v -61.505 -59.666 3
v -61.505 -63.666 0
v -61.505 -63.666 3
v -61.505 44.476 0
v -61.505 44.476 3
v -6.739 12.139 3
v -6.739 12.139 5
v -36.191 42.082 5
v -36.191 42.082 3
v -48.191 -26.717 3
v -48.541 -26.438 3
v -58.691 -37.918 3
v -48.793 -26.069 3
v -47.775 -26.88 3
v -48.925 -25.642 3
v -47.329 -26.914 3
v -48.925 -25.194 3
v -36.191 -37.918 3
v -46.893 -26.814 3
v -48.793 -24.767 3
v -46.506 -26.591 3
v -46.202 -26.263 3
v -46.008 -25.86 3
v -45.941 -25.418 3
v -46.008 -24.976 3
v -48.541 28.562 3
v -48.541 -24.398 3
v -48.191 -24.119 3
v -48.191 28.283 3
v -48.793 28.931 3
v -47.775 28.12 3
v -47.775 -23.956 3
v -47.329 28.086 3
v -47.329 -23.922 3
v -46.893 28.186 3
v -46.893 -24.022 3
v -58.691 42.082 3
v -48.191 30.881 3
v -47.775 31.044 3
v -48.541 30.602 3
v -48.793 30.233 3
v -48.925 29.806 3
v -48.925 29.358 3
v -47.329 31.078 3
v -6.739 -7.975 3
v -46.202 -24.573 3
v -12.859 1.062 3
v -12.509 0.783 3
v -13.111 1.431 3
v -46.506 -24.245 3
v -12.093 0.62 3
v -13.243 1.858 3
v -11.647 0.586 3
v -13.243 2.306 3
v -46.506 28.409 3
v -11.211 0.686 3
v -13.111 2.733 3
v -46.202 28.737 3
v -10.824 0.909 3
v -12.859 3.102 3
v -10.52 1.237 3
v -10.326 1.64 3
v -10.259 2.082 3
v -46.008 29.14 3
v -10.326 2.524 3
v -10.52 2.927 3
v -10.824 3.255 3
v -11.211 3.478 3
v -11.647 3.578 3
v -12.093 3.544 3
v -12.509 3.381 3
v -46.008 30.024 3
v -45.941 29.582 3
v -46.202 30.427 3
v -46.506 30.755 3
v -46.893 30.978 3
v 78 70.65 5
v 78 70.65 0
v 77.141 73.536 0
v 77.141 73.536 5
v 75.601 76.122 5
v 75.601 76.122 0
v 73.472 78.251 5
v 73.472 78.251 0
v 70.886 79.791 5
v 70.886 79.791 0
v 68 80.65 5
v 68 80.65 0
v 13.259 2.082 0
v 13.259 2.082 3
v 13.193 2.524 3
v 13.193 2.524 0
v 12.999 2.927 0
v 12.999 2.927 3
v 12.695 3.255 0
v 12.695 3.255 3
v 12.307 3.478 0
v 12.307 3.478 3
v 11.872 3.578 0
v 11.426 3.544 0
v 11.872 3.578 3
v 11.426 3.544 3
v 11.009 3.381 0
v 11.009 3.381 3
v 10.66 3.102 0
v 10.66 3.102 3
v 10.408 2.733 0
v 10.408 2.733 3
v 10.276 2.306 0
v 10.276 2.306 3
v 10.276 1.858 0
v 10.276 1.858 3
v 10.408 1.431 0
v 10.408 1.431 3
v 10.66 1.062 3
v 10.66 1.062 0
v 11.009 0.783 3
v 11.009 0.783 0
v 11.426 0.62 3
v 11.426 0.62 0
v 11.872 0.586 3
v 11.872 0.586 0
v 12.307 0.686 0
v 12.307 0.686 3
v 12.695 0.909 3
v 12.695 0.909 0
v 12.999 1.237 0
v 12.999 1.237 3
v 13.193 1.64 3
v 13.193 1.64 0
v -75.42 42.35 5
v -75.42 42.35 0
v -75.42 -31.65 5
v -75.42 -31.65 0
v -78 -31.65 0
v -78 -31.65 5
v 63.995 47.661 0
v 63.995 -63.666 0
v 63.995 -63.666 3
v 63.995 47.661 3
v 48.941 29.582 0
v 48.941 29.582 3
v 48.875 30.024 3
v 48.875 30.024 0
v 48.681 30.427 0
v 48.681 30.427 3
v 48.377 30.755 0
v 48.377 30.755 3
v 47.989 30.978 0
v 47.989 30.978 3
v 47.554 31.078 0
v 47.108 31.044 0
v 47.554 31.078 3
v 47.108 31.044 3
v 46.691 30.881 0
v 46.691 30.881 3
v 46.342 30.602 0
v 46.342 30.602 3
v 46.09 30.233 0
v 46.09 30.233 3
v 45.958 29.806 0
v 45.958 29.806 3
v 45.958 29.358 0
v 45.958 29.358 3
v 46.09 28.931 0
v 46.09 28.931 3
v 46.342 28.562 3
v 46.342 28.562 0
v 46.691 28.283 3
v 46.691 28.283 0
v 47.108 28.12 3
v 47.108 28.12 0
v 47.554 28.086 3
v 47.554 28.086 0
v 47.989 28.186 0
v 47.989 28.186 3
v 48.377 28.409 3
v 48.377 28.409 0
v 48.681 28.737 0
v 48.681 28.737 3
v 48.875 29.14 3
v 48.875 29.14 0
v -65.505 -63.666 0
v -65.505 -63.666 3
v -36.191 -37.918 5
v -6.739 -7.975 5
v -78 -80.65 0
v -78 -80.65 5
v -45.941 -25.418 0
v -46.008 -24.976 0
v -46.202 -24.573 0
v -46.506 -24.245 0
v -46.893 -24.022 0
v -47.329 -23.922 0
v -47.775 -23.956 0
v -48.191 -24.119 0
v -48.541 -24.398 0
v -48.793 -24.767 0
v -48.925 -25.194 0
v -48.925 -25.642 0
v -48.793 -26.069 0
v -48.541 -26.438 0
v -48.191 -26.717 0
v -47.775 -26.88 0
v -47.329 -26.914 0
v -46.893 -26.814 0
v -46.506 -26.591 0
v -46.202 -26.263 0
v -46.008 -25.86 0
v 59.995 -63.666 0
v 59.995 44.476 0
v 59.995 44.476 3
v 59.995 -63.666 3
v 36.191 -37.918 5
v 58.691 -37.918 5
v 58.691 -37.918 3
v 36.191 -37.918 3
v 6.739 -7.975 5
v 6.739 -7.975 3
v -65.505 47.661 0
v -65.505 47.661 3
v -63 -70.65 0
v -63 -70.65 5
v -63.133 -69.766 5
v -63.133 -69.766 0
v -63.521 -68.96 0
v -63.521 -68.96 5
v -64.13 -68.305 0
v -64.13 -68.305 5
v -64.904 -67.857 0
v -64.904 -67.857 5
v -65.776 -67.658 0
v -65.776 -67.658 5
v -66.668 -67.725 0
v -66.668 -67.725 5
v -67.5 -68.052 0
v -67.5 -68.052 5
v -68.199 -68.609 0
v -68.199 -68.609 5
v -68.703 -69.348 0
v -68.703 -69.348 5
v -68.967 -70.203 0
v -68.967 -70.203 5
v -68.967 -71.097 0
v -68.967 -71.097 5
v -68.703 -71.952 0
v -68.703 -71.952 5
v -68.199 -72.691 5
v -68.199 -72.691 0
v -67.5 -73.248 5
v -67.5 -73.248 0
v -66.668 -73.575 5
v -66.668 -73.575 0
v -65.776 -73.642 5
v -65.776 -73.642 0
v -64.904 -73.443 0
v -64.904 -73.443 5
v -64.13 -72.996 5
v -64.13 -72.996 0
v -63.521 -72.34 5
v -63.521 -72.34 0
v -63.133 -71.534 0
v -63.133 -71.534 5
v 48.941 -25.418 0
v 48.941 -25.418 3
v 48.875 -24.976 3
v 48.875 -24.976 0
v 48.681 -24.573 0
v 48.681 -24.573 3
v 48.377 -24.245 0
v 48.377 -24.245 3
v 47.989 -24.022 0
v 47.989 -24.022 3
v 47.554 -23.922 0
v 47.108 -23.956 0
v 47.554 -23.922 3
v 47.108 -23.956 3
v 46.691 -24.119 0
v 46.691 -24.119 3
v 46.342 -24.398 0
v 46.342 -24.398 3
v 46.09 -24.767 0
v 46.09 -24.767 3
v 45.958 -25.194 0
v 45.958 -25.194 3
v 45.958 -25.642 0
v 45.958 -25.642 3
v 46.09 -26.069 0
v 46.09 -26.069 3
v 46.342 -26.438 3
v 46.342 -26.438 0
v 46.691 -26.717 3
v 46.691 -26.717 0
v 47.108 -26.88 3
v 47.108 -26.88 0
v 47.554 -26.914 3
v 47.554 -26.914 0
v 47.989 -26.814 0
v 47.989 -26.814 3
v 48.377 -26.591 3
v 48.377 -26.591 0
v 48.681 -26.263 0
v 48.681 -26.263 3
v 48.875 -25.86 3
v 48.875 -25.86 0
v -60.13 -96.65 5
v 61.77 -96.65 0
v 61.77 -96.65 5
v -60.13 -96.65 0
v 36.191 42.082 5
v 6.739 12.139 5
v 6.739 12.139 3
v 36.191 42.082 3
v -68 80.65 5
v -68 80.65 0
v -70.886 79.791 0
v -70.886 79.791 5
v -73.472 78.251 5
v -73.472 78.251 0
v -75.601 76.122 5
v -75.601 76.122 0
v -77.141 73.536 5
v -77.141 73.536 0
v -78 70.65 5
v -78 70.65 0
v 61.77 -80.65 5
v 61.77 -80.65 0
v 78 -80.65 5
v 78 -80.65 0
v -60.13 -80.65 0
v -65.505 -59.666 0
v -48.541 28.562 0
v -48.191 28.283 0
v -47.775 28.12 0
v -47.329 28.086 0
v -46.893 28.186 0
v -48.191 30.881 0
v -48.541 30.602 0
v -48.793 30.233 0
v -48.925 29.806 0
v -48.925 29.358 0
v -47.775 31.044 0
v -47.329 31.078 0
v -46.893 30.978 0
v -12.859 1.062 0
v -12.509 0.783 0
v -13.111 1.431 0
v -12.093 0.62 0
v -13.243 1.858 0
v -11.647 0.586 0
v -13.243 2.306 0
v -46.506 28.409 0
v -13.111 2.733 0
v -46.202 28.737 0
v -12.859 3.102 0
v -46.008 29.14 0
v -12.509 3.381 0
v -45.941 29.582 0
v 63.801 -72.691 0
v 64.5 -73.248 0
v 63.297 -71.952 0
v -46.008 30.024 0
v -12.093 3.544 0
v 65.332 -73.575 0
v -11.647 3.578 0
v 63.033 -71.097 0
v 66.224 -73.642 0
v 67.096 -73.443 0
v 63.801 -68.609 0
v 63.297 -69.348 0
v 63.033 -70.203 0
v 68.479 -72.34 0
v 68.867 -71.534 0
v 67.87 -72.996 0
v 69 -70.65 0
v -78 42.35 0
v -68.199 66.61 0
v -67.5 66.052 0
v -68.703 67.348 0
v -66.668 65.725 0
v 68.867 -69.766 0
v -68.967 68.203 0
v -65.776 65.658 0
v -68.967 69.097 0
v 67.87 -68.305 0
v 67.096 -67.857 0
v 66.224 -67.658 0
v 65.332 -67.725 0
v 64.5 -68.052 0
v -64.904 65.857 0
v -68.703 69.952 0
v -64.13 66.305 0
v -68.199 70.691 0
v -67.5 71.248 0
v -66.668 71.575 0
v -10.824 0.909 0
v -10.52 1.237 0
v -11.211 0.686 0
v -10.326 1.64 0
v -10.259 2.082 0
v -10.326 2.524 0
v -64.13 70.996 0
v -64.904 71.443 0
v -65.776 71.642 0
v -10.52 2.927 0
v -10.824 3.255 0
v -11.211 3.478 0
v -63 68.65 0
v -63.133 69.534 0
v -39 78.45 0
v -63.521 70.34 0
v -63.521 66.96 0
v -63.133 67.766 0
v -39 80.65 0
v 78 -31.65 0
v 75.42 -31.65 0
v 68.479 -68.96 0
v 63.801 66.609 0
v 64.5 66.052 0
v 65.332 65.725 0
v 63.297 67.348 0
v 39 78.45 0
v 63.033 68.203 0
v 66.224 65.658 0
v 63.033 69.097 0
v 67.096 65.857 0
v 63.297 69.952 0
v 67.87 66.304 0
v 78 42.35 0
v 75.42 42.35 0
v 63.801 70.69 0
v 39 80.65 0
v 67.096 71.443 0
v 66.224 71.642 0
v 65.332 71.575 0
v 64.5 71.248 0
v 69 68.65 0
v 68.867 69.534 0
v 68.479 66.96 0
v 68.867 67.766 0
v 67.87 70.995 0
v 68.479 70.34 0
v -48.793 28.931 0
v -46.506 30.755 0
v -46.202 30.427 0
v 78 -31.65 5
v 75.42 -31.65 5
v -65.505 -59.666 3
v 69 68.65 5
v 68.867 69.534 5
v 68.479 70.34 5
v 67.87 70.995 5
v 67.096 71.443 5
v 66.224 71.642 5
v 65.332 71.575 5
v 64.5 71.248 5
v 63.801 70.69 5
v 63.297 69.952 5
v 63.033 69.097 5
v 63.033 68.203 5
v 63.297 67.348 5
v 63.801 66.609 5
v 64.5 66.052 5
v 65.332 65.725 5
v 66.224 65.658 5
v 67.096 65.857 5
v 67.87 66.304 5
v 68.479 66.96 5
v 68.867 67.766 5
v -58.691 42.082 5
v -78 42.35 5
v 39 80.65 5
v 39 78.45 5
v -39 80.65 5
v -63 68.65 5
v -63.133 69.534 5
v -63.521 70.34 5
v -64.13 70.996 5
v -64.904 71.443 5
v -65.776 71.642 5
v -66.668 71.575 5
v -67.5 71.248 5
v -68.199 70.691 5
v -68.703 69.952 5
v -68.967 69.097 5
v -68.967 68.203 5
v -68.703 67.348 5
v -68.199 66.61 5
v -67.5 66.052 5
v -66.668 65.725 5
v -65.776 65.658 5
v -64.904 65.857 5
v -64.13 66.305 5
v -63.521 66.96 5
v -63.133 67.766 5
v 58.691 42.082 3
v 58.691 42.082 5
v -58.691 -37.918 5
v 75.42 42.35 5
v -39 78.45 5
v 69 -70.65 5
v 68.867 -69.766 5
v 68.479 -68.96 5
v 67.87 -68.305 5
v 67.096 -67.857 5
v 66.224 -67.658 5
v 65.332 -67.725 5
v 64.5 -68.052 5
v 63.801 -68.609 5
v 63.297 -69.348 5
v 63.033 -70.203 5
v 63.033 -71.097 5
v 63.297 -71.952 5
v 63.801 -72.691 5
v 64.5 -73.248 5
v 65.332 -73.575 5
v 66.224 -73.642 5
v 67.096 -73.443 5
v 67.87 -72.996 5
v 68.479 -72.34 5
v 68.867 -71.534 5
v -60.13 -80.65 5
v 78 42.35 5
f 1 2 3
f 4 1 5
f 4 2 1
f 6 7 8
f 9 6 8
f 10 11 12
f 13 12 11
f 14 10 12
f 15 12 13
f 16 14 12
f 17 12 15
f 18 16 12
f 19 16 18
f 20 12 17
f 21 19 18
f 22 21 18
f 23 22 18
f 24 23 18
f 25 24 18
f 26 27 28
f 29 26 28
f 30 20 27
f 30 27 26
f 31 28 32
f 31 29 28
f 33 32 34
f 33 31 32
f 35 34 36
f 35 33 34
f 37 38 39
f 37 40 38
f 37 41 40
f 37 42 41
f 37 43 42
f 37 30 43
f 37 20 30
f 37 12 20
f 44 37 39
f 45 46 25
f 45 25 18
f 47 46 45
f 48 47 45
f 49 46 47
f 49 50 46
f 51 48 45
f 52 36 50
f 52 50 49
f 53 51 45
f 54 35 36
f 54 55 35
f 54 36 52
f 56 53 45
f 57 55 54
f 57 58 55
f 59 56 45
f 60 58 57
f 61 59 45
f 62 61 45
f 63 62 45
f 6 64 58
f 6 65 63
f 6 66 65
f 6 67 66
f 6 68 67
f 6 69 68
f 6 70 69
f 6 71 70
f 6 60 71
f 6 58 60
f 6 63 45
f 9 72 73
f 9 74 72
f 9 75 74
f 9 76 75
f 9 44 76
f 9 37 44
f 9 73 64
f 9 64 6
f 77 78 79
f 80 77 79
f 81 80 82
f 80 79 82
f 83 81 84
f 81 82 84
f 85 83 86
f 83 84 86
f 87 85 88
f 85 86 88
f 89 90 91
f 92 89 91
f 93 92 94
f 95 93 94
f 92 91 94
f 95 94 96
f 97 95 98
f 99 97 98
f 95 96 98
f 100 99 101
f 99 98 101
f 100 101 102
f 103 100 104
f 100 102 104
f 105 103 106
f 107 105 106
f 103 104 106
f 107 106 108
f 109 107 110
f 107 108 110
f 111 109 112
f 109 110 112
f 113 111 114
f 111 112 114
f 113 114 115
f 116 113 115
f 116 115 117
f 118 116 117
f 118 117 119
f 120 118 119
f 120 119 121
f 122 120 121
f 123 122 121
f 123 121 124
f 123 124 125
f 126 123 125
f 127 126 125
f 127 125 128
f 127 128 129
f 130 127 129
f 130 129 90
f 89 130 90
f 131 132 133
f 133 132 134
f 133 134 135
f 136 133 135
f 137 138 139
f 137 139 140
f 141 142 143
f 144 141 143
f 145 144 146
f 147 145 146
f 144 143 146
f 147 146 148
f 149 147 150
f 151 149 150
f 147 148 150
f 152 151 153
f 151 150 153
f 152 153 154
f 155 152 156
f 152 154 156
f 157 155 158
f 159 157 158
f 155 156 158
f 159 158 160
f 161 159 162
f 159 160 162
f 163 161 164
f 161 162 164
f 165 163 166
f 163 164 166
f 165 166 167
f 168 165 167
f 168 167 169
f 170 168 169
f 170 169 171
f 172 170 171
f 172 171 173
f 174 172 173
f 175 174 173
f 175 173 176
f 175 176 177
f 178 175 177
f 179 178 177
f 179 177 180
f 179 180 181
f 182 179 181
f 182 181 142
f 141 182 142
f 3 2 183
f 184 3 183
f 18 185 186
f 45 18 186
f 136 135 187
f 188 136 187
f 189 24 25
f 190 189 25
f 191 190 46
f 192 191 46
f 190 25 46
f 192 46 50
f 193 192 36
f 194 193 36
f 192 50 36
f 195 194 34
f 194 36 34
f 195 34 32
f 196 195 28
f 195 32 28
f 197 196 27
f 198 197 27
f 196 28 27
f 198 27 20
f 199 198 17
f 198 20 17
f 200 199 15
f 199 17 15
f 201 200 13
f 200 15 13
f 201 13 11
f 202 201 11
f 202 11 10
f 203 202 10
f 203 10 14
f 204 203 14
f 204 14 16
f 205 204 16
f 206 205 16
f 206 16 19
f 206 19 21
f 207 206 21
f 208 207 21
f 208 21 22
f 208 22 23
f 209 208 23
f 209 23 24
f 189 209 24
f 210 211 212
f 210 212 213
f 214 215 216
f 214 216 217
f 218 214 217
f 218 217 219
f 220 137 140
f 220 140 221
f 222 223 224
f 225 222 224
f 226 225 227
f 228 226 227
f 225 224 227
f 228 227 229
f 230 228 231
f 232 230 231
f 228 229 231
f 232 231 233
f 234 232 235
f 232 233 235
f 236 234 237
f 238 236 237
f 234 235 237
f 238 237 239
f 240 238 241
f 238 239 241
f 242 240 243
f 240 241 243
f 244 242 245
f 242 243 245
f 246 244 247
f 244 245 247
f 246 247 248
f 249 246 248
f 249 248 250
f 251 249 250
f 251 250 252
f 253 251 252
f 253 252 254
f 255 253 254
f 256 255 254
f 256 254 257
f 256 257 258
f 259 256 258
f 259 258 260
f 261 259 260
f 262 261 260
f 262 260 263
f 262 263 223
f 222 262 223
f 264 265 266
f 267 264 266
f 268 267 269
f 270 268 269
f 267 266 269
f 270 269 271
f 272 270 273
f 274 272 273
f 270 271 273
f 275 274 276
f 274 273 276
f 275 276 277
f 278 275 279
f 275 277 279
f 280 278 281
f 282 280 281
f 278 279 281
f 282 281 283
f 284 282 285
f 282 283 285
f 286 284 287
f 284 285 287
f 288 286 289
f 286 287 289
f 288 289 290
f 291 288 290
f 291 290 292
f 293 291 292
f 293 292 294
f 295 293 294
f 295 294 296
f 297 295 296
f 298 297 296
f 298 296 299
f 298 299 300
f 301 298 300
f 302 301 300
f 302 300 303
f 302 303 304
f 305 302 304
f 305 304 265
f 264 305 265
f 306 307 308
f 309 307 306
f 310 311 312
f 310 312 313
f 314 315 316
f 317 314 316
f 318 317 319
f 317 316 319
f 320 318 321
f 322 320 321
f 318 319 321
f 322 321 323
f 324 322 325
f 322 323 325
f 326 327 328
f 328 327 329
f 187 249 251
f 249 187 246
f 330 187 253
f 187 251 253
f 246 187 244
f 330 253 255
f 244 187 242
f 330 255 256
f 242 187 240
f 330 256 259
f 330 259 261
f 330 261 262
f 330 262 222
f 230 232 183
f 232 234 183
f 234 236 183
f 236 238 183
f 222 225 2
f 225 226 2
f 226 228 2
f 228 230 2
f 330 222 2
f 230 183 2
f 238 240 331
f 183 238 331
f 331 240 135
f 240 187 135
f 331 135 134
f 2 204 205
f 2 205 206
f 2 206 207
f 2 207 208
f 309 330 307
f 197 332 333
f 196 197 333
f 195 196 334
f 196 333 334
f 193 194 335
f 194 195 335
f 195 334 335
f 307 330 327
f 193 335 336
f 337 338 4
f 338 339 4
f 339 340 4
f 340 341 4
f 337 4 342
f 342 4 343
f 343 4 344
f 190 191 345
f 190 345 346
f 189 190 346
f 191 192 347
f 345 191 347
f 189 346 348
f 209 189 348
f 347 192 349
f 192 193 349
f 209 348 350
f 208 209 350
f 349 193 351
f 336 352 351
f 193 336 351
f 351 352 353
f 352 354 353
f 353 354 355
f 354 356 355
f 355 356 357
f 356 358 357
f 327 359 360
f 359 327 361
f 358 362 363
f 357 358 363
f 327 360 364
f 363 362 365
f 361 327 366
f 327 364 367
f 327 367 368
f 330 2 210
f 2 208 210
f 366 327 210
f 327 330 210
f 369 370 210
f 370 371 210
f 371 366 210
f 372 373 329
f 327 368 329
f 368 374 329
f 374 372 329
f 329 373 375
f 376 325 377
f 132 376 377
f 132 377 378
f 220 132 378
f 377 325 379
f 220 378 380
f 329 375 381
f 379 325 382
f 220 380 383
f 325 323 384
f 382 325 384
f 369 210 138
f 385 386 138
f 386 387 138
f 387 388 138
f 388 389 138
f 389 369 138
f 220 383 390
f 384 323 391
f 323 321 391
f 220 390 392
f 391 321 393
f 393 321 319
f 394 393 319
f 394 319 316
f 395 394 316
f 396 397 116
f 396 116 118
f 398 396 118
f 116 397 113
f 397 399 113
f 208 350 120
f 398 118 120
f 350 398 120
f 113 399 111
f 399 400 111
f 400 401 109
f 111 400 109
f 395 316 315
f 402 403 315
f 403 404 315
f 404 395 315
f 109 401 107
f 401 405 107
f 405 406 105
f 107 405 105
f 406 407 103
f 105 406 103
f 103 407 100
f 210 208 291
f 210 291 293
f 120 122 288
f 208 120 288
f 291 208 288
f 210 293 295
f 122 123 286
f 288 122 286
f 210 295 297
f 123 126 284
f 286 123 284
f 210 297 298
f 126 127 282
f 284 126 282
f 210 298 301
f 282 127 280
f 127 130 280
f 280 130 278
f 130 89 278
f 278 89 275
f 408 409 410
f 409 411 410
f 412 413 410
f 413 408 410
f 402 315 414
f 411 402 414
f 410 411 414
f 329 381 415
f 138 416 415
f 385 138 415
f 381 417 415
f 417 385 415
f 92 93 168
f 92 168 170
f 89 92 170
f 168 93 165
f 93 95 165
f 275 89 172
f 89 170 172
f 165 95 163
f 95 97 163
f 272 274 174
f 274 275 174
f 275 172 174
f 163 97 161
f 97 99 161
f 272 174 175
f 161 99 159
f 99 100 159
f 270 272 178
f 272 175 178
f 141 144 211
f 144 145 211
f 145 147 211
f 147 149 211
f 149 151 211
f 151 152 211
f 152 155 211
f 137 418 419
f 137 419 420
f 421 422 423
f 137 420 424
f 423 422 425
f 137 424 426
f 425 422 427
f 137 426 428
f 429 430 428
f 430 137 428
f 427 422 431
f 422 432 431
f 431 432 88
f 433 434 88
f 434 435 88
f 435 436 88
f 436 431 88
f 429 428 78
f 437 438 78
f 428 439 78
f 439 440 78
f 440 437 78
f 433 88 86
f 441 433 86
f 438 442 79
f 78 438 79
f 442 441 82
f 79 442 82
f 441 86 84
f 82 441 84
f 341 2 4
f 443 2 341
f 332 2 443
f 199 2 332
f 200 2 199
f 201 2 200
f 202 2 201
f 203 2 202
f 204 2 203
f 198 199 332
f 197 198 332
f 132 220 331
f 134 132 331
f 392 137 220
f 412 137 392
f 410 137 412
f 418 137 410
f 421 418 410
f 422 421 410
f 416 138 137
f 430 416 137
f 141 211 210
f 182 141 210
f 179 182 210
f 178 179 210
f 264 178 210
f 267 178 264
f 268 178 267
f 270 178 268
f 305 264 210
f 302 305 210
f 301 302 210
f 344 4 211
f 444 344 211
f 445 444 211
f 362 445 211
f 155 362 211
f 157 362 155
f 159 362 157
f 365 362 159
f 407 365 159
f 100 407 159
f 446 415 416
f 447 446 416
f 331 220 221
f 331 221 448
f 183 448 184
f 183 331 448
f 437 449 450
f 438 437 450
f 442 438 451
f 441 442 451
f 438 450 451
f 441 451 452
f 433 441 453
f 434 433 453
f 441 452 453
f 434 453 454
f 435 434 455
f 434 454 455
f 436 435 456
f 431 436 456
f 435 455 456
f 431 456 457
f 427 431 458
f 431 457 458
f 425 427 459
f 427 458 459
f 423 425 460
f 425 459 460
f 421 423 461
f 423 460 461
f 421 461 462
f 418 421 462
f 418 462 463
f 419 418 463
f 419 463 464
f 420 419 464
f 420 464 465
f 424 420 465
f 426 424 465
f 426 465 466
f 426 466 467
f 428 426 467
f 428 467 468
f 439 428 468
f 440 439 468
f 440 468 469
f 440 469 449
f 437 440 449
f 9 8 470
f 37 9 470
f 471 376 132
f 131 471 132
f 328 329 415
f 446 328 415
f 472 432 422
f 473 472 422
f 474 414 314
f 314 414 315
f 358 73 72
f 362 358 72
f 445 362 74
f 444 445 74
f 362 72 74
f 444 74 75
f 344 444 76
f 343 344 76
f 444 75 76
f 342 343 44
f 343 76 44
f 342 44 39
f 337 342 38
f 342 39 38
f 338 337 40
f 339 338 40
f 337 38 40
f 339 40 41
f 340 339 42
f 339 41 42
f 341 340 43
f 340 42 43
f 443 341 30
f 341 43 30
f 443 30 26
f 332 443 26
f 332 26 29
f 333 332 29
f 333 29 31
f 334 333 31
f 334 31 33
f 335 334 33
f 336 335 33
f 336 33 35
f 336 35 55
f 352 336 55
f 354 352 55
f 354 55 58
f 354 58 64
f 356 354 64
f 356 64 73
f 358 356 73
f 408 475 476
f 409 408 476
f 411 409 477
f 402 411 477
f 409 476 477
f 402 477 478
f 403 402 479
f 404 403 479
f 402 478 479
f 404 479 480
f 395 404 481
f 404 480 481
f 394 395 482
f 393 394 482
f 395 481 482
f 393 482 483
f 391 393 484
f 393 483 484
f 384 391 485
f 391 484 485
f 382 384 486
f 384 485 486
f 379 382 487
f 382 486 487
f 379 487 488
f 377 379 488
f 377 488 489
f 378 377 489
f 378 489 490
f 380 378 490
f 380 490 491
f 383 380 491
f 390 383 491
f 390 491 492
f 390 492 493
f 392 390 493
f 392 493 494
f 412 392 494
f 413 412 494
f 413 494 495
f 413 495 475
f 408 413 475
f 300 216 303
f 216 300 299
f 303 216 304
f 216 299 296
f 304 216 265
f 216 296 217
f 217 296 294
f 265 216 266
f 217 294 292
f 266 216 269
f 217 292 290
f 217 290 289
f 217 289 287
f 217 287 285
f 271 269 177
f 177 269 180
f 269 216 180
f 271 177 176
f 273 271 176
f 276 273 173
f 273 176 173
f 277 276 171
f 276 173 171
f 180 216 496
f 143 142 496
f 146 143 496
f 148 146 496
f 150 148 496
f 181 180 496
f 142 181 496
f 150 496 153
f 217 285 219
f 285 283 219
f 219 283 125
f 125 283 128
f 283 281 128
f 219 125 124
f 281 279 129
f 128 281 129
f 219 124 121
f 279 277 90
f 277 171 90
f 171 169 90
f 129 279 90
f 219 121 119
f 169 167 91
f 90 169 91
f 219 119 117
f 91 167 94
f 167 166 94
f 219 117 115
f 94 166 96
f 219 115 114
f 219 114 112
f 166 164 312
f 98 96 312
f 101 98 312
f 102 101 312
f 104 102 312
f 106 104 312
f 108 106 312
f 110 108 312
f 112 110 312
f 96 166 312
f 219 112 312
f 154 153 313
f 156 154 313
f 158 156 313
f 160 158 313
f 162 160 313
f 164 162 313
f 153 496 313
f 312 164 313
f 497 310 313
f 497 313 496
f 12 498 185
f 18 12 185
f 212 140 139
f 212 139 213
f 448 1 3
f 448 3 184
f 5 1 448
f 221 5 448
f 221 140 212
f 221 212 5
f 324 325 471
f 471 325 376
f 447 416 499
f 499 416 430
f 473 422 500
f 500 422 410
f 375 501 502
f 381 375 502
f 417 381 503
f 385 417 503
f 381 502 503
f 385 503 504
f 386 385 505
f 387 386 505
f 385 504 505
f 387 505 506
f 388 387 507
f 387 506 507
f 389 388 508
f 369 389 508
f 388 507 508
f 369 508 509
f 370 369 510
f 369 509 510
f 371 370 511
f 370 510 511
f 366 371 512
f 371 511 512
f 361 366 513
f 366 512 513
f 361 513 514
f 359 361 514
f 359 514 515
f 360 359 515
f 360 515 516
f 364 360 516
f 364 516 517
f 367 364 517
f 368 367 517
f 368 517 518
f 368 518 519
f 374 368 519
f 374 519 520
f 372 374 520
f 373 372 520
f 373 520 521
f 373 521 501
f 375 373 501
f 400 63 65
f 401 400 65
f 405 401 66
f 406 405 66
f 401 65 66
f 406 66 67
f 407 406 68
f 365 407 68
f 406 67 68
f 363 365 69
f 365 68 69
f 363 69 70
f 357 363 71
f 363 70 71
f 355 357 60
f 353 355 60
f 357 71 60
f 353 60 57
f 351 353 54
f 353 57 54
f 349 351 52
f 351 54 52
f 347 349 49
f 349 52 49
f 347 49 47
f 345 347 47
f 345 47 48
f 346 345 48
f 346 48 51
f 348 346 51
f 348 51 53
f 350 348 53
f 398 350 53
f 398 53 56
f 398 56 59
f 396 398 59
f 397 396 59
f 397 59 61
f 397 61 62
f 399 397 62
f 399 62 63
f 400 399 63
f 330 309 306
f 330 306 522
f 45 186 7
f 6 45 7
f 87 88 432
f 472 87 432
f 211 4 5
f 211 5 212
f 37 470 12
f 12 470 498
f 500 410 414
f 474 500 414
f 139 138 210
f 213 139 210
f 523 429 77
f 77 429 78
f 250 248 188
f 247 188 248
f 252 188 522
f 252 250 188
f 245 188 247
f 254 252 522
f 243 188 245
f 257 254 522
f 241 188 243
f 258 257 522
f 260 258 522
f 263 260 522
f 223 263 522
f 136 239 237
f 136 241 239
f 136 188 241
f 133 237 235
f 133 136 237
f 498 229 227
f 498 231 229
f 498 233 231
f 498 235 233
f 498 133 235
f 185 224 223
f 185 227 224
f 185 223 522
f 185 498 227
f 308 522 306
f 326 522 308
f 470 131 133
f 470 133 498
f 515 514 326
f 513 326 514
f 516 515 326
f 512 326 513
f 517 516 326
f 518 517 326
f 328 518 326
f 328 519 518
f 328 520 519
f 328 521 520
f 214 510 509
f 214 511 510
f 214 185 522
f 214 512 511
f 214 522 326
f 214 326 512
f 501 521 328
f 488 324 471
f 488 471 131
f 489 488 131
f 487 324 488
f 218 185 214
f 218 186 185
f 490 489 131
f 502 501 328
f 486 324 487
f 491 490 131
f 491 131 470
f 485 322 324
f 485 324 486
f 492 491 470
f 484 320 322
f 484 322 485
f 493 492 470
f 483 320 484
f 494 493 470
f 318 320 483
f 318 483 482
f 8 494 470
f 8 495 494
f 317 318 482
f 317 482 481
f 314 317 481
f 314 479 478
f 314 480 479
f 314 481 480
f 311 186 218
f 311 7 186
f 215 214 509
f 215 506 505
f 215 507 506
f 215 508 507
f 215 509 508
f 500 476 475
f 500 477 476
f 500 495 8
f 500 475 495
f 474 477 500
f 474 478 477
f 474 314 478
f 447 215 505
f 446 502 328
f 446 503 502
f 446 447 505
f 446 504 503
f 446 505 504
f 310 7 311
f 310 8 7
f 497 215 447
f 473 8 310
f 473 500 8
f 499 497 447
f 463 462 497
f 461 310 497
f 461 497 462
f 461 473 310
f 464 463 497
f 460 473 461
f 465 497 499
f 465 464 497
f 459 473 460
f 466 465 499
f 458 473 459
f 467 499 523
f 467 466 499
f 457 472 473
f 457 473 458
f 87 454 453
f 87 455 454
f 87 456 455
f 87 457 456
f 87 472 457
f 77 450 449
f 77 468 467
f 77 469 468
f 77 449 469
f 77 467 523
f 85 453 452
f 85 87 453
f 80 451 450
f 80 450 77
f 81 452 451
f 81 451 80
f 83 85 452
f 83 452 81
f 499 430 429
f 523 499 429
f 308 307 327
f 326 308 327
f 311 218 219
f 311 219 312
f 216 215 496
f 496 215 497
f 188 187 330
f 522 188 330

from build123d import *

# Parameters (mm, degrees)
BOSS_EXTRUDE1_DEPTH = 5
CUT_EXTRUDE1_DEPTH  = 2
SKETCH3_R           = 3
CUT_EXTRUDE2_DEPTH  = 42
SKETCH6_W           = 4
SKETCH6_H           = 4
SKETCH6_W_2         = 3.999984741
CUT_EXTRUDE4_DEPTH  = 3
CUT_EXTRUDE5_DEPTH  = 3
SKETCH8_W           = 121.9
SKETCH8_H           = 16
BOSS_EXTRUDE2_DEPTH = 5
SKETCH10_R          = 1.5
CUT_EXTRUDE6_DEPTH  = 10


with BuildPart() as part:
    # Sketch1 → Boss-Extrude1 (new body)
    with BuildSketch(Plane.XY):
        with BuildLine():
            Line((-75.420043945, 42.350021362), (-75.420043945, -31.650009155))
            Line((-75.420043945, -31.650009155), (-78, -31.650009155))
            Line((-78, -31.650009155), (-78, -80.650009155))
            Line((-78, -80.650009155), (78, -80.650009155))
            Line((78, -80.650009155), (78, -31.650009155))
            Line((78, -31.650009155), (75.419921875, -31.650009155))
            Line((75.419921875, -31.650009155), (75.419921875, 42.350021362))
            Line((75.419921875, 42.350021362), (78, 42.350021362))
            Line((78, 42.350021362), (78, 70.650009155))
            ThreePointArc((78, 70.650009155), (74.602310181, 77.252319336), (68, 80.650009155))
            Line((68, 80.650009155), (39, 80.650009155))
            Line((39, 80.650009155), (39, 78.449996948))
            Line((39, 78.449996948), (-39, 78.449996948))
            Line((-39, 78.449996948), (-39, 80.650009155))
            Line((-39, 80.650009155), (-68, 80.650009155))
            ThreePointArc((-68, 80.650009155), (-74.602340698, 77.252349854), (-78, 70.650009155))
            Line((-78, 70.650009155), (-78, 42.350021362))
            Line((-78, 42.350021362), (-75.420043945, 42.350021362))
        make_face()
    extrude(amount=BOSS_EXTRUDE1_DEPTH)

    # Sketch2 → Cut-Extrude1 (cut)
    with BuildSketch(Plane.XY.offset(5)):
        Polygon((-6.739431127, -7.975087618), (-6.739431127, 12.139103822), (-36.191468123, 42.082008102), (-58.691468123, 42.082008102), (-58.691468123, 2.082008102), (-58.691468123, -37.917991898), (-36.191468123, -37.917991898), align=None)
        Polygon((6.739431127, 12.139103822), (36.191468123, 42.082008102), (58.691468123, 42.082008102), (58.691468123, 2.082008102), (58.691468123, -37.917991898), (36.191468123, -37.917991898), (6.739431127, -7.975087618), align=None)
    extrude(amount=-CUT_EXTRUDE1_DEPTH, mode=Mode.SUBTRACT)

    # Sketch3 → Cut-Extrude2 (cut)
    with BuildSketch(Plane.XY.offset(5)):
        with Locations((-66.000082844, 68.650091999)):
            Circle(SKETCH3_R)
        with Locations((65.999919006, 68.649928161)):
            Circle(SKETCH3_R)
        with Locations((-66.000082844, -70.650009155)):
            Circle(SKETCH3_R)
        with Locations((65.999919006, -70.650009155)):
            Circle(SKETCH3_R)
    extrude(amount=-CUT_EXTRUDE2_DEPTH, mode=Mode.SUBTRACT)

    # Sketch6 → Cut-Extrude4 (cut)
    with BuildSketch(Plane(origin=(0, 0, 0), x_dir=(-1, 0, 0), z_dir=(0, 0, -1))):
        with Locations((-61.995116115, -61.665595666)):
            Rectangle(SKETCH6_W, SKETCH6_H)
        with Locations((63.504872442, -61.665595666)):
            Rectangle(SKETCH6_W_2, SKETCH6_H)
    extrude(amount=-CUT_EXTRUDE4_DEPTH, mode=Mode.SUBTRACT)

    # Sketch7 → Cut-Extrude5 (cut)
    with BuildSketch(Plane(origin=(0, 0, 0), x_dir=(-1, 0, 0), z_dir=(0, 0, -1))):
        Polygon((-63.995116115, -59.665595666), (-63.995116115, 47.660531993), (65.504864812, 47.660531993), (65.504864812, -59.665595666), (61.504880071, -59.665595666), (61.504880071, 44.476086648), (-59.995116115, 44.476086648), (-59.995116115, -59.665595666), align=None)
    extrude(amount=-CUT_EXTRUDE5_DEPTH, mode=Mode.SUBTRACT)

    # Sketch8 → Boss-Extrude2 (add)
    with BuildSketch(Plane(origin=(0, 0, 0), x_dir=(-1, 0, 0), z_dir=(0, 0, -1))):
        with Locations((-0.820022175, -88.650009155)):
            Rectangle(SKETCH8_W, SKETCH8_H)
    extrude(amount=-BOSS_EXTRUDE2_DEPTH)

    # Sketch10 → Cut-Extrude6 (cut)
    with BuildSketch(Plane.XY.offset(3)):
        with Locations((-47.441468123, 29.582008102)):
            Circle(SKETCH10_R)
        with Locations((-47.441468123, -25.417991898)):
            Circle(SKETCH10_R)
        with Locations((-11.759431127, 2.082008102)):
            Circle(SKETCH10_R)
        with Locations((11.759431127, 2.082008102)):
            Circle(SKETCH10_R)
        with Locations((47.441468123, -25.417991898)):
            Circle(SKETCH10_R)
        with Locations((47.441468123, 29.582008102)):
            Circle(SKETCH10_R)
    extrude(amount=-CUT_EXTRUDE6_DEPTH, mode=Mode.SUBTRACT)


solid = part.part
